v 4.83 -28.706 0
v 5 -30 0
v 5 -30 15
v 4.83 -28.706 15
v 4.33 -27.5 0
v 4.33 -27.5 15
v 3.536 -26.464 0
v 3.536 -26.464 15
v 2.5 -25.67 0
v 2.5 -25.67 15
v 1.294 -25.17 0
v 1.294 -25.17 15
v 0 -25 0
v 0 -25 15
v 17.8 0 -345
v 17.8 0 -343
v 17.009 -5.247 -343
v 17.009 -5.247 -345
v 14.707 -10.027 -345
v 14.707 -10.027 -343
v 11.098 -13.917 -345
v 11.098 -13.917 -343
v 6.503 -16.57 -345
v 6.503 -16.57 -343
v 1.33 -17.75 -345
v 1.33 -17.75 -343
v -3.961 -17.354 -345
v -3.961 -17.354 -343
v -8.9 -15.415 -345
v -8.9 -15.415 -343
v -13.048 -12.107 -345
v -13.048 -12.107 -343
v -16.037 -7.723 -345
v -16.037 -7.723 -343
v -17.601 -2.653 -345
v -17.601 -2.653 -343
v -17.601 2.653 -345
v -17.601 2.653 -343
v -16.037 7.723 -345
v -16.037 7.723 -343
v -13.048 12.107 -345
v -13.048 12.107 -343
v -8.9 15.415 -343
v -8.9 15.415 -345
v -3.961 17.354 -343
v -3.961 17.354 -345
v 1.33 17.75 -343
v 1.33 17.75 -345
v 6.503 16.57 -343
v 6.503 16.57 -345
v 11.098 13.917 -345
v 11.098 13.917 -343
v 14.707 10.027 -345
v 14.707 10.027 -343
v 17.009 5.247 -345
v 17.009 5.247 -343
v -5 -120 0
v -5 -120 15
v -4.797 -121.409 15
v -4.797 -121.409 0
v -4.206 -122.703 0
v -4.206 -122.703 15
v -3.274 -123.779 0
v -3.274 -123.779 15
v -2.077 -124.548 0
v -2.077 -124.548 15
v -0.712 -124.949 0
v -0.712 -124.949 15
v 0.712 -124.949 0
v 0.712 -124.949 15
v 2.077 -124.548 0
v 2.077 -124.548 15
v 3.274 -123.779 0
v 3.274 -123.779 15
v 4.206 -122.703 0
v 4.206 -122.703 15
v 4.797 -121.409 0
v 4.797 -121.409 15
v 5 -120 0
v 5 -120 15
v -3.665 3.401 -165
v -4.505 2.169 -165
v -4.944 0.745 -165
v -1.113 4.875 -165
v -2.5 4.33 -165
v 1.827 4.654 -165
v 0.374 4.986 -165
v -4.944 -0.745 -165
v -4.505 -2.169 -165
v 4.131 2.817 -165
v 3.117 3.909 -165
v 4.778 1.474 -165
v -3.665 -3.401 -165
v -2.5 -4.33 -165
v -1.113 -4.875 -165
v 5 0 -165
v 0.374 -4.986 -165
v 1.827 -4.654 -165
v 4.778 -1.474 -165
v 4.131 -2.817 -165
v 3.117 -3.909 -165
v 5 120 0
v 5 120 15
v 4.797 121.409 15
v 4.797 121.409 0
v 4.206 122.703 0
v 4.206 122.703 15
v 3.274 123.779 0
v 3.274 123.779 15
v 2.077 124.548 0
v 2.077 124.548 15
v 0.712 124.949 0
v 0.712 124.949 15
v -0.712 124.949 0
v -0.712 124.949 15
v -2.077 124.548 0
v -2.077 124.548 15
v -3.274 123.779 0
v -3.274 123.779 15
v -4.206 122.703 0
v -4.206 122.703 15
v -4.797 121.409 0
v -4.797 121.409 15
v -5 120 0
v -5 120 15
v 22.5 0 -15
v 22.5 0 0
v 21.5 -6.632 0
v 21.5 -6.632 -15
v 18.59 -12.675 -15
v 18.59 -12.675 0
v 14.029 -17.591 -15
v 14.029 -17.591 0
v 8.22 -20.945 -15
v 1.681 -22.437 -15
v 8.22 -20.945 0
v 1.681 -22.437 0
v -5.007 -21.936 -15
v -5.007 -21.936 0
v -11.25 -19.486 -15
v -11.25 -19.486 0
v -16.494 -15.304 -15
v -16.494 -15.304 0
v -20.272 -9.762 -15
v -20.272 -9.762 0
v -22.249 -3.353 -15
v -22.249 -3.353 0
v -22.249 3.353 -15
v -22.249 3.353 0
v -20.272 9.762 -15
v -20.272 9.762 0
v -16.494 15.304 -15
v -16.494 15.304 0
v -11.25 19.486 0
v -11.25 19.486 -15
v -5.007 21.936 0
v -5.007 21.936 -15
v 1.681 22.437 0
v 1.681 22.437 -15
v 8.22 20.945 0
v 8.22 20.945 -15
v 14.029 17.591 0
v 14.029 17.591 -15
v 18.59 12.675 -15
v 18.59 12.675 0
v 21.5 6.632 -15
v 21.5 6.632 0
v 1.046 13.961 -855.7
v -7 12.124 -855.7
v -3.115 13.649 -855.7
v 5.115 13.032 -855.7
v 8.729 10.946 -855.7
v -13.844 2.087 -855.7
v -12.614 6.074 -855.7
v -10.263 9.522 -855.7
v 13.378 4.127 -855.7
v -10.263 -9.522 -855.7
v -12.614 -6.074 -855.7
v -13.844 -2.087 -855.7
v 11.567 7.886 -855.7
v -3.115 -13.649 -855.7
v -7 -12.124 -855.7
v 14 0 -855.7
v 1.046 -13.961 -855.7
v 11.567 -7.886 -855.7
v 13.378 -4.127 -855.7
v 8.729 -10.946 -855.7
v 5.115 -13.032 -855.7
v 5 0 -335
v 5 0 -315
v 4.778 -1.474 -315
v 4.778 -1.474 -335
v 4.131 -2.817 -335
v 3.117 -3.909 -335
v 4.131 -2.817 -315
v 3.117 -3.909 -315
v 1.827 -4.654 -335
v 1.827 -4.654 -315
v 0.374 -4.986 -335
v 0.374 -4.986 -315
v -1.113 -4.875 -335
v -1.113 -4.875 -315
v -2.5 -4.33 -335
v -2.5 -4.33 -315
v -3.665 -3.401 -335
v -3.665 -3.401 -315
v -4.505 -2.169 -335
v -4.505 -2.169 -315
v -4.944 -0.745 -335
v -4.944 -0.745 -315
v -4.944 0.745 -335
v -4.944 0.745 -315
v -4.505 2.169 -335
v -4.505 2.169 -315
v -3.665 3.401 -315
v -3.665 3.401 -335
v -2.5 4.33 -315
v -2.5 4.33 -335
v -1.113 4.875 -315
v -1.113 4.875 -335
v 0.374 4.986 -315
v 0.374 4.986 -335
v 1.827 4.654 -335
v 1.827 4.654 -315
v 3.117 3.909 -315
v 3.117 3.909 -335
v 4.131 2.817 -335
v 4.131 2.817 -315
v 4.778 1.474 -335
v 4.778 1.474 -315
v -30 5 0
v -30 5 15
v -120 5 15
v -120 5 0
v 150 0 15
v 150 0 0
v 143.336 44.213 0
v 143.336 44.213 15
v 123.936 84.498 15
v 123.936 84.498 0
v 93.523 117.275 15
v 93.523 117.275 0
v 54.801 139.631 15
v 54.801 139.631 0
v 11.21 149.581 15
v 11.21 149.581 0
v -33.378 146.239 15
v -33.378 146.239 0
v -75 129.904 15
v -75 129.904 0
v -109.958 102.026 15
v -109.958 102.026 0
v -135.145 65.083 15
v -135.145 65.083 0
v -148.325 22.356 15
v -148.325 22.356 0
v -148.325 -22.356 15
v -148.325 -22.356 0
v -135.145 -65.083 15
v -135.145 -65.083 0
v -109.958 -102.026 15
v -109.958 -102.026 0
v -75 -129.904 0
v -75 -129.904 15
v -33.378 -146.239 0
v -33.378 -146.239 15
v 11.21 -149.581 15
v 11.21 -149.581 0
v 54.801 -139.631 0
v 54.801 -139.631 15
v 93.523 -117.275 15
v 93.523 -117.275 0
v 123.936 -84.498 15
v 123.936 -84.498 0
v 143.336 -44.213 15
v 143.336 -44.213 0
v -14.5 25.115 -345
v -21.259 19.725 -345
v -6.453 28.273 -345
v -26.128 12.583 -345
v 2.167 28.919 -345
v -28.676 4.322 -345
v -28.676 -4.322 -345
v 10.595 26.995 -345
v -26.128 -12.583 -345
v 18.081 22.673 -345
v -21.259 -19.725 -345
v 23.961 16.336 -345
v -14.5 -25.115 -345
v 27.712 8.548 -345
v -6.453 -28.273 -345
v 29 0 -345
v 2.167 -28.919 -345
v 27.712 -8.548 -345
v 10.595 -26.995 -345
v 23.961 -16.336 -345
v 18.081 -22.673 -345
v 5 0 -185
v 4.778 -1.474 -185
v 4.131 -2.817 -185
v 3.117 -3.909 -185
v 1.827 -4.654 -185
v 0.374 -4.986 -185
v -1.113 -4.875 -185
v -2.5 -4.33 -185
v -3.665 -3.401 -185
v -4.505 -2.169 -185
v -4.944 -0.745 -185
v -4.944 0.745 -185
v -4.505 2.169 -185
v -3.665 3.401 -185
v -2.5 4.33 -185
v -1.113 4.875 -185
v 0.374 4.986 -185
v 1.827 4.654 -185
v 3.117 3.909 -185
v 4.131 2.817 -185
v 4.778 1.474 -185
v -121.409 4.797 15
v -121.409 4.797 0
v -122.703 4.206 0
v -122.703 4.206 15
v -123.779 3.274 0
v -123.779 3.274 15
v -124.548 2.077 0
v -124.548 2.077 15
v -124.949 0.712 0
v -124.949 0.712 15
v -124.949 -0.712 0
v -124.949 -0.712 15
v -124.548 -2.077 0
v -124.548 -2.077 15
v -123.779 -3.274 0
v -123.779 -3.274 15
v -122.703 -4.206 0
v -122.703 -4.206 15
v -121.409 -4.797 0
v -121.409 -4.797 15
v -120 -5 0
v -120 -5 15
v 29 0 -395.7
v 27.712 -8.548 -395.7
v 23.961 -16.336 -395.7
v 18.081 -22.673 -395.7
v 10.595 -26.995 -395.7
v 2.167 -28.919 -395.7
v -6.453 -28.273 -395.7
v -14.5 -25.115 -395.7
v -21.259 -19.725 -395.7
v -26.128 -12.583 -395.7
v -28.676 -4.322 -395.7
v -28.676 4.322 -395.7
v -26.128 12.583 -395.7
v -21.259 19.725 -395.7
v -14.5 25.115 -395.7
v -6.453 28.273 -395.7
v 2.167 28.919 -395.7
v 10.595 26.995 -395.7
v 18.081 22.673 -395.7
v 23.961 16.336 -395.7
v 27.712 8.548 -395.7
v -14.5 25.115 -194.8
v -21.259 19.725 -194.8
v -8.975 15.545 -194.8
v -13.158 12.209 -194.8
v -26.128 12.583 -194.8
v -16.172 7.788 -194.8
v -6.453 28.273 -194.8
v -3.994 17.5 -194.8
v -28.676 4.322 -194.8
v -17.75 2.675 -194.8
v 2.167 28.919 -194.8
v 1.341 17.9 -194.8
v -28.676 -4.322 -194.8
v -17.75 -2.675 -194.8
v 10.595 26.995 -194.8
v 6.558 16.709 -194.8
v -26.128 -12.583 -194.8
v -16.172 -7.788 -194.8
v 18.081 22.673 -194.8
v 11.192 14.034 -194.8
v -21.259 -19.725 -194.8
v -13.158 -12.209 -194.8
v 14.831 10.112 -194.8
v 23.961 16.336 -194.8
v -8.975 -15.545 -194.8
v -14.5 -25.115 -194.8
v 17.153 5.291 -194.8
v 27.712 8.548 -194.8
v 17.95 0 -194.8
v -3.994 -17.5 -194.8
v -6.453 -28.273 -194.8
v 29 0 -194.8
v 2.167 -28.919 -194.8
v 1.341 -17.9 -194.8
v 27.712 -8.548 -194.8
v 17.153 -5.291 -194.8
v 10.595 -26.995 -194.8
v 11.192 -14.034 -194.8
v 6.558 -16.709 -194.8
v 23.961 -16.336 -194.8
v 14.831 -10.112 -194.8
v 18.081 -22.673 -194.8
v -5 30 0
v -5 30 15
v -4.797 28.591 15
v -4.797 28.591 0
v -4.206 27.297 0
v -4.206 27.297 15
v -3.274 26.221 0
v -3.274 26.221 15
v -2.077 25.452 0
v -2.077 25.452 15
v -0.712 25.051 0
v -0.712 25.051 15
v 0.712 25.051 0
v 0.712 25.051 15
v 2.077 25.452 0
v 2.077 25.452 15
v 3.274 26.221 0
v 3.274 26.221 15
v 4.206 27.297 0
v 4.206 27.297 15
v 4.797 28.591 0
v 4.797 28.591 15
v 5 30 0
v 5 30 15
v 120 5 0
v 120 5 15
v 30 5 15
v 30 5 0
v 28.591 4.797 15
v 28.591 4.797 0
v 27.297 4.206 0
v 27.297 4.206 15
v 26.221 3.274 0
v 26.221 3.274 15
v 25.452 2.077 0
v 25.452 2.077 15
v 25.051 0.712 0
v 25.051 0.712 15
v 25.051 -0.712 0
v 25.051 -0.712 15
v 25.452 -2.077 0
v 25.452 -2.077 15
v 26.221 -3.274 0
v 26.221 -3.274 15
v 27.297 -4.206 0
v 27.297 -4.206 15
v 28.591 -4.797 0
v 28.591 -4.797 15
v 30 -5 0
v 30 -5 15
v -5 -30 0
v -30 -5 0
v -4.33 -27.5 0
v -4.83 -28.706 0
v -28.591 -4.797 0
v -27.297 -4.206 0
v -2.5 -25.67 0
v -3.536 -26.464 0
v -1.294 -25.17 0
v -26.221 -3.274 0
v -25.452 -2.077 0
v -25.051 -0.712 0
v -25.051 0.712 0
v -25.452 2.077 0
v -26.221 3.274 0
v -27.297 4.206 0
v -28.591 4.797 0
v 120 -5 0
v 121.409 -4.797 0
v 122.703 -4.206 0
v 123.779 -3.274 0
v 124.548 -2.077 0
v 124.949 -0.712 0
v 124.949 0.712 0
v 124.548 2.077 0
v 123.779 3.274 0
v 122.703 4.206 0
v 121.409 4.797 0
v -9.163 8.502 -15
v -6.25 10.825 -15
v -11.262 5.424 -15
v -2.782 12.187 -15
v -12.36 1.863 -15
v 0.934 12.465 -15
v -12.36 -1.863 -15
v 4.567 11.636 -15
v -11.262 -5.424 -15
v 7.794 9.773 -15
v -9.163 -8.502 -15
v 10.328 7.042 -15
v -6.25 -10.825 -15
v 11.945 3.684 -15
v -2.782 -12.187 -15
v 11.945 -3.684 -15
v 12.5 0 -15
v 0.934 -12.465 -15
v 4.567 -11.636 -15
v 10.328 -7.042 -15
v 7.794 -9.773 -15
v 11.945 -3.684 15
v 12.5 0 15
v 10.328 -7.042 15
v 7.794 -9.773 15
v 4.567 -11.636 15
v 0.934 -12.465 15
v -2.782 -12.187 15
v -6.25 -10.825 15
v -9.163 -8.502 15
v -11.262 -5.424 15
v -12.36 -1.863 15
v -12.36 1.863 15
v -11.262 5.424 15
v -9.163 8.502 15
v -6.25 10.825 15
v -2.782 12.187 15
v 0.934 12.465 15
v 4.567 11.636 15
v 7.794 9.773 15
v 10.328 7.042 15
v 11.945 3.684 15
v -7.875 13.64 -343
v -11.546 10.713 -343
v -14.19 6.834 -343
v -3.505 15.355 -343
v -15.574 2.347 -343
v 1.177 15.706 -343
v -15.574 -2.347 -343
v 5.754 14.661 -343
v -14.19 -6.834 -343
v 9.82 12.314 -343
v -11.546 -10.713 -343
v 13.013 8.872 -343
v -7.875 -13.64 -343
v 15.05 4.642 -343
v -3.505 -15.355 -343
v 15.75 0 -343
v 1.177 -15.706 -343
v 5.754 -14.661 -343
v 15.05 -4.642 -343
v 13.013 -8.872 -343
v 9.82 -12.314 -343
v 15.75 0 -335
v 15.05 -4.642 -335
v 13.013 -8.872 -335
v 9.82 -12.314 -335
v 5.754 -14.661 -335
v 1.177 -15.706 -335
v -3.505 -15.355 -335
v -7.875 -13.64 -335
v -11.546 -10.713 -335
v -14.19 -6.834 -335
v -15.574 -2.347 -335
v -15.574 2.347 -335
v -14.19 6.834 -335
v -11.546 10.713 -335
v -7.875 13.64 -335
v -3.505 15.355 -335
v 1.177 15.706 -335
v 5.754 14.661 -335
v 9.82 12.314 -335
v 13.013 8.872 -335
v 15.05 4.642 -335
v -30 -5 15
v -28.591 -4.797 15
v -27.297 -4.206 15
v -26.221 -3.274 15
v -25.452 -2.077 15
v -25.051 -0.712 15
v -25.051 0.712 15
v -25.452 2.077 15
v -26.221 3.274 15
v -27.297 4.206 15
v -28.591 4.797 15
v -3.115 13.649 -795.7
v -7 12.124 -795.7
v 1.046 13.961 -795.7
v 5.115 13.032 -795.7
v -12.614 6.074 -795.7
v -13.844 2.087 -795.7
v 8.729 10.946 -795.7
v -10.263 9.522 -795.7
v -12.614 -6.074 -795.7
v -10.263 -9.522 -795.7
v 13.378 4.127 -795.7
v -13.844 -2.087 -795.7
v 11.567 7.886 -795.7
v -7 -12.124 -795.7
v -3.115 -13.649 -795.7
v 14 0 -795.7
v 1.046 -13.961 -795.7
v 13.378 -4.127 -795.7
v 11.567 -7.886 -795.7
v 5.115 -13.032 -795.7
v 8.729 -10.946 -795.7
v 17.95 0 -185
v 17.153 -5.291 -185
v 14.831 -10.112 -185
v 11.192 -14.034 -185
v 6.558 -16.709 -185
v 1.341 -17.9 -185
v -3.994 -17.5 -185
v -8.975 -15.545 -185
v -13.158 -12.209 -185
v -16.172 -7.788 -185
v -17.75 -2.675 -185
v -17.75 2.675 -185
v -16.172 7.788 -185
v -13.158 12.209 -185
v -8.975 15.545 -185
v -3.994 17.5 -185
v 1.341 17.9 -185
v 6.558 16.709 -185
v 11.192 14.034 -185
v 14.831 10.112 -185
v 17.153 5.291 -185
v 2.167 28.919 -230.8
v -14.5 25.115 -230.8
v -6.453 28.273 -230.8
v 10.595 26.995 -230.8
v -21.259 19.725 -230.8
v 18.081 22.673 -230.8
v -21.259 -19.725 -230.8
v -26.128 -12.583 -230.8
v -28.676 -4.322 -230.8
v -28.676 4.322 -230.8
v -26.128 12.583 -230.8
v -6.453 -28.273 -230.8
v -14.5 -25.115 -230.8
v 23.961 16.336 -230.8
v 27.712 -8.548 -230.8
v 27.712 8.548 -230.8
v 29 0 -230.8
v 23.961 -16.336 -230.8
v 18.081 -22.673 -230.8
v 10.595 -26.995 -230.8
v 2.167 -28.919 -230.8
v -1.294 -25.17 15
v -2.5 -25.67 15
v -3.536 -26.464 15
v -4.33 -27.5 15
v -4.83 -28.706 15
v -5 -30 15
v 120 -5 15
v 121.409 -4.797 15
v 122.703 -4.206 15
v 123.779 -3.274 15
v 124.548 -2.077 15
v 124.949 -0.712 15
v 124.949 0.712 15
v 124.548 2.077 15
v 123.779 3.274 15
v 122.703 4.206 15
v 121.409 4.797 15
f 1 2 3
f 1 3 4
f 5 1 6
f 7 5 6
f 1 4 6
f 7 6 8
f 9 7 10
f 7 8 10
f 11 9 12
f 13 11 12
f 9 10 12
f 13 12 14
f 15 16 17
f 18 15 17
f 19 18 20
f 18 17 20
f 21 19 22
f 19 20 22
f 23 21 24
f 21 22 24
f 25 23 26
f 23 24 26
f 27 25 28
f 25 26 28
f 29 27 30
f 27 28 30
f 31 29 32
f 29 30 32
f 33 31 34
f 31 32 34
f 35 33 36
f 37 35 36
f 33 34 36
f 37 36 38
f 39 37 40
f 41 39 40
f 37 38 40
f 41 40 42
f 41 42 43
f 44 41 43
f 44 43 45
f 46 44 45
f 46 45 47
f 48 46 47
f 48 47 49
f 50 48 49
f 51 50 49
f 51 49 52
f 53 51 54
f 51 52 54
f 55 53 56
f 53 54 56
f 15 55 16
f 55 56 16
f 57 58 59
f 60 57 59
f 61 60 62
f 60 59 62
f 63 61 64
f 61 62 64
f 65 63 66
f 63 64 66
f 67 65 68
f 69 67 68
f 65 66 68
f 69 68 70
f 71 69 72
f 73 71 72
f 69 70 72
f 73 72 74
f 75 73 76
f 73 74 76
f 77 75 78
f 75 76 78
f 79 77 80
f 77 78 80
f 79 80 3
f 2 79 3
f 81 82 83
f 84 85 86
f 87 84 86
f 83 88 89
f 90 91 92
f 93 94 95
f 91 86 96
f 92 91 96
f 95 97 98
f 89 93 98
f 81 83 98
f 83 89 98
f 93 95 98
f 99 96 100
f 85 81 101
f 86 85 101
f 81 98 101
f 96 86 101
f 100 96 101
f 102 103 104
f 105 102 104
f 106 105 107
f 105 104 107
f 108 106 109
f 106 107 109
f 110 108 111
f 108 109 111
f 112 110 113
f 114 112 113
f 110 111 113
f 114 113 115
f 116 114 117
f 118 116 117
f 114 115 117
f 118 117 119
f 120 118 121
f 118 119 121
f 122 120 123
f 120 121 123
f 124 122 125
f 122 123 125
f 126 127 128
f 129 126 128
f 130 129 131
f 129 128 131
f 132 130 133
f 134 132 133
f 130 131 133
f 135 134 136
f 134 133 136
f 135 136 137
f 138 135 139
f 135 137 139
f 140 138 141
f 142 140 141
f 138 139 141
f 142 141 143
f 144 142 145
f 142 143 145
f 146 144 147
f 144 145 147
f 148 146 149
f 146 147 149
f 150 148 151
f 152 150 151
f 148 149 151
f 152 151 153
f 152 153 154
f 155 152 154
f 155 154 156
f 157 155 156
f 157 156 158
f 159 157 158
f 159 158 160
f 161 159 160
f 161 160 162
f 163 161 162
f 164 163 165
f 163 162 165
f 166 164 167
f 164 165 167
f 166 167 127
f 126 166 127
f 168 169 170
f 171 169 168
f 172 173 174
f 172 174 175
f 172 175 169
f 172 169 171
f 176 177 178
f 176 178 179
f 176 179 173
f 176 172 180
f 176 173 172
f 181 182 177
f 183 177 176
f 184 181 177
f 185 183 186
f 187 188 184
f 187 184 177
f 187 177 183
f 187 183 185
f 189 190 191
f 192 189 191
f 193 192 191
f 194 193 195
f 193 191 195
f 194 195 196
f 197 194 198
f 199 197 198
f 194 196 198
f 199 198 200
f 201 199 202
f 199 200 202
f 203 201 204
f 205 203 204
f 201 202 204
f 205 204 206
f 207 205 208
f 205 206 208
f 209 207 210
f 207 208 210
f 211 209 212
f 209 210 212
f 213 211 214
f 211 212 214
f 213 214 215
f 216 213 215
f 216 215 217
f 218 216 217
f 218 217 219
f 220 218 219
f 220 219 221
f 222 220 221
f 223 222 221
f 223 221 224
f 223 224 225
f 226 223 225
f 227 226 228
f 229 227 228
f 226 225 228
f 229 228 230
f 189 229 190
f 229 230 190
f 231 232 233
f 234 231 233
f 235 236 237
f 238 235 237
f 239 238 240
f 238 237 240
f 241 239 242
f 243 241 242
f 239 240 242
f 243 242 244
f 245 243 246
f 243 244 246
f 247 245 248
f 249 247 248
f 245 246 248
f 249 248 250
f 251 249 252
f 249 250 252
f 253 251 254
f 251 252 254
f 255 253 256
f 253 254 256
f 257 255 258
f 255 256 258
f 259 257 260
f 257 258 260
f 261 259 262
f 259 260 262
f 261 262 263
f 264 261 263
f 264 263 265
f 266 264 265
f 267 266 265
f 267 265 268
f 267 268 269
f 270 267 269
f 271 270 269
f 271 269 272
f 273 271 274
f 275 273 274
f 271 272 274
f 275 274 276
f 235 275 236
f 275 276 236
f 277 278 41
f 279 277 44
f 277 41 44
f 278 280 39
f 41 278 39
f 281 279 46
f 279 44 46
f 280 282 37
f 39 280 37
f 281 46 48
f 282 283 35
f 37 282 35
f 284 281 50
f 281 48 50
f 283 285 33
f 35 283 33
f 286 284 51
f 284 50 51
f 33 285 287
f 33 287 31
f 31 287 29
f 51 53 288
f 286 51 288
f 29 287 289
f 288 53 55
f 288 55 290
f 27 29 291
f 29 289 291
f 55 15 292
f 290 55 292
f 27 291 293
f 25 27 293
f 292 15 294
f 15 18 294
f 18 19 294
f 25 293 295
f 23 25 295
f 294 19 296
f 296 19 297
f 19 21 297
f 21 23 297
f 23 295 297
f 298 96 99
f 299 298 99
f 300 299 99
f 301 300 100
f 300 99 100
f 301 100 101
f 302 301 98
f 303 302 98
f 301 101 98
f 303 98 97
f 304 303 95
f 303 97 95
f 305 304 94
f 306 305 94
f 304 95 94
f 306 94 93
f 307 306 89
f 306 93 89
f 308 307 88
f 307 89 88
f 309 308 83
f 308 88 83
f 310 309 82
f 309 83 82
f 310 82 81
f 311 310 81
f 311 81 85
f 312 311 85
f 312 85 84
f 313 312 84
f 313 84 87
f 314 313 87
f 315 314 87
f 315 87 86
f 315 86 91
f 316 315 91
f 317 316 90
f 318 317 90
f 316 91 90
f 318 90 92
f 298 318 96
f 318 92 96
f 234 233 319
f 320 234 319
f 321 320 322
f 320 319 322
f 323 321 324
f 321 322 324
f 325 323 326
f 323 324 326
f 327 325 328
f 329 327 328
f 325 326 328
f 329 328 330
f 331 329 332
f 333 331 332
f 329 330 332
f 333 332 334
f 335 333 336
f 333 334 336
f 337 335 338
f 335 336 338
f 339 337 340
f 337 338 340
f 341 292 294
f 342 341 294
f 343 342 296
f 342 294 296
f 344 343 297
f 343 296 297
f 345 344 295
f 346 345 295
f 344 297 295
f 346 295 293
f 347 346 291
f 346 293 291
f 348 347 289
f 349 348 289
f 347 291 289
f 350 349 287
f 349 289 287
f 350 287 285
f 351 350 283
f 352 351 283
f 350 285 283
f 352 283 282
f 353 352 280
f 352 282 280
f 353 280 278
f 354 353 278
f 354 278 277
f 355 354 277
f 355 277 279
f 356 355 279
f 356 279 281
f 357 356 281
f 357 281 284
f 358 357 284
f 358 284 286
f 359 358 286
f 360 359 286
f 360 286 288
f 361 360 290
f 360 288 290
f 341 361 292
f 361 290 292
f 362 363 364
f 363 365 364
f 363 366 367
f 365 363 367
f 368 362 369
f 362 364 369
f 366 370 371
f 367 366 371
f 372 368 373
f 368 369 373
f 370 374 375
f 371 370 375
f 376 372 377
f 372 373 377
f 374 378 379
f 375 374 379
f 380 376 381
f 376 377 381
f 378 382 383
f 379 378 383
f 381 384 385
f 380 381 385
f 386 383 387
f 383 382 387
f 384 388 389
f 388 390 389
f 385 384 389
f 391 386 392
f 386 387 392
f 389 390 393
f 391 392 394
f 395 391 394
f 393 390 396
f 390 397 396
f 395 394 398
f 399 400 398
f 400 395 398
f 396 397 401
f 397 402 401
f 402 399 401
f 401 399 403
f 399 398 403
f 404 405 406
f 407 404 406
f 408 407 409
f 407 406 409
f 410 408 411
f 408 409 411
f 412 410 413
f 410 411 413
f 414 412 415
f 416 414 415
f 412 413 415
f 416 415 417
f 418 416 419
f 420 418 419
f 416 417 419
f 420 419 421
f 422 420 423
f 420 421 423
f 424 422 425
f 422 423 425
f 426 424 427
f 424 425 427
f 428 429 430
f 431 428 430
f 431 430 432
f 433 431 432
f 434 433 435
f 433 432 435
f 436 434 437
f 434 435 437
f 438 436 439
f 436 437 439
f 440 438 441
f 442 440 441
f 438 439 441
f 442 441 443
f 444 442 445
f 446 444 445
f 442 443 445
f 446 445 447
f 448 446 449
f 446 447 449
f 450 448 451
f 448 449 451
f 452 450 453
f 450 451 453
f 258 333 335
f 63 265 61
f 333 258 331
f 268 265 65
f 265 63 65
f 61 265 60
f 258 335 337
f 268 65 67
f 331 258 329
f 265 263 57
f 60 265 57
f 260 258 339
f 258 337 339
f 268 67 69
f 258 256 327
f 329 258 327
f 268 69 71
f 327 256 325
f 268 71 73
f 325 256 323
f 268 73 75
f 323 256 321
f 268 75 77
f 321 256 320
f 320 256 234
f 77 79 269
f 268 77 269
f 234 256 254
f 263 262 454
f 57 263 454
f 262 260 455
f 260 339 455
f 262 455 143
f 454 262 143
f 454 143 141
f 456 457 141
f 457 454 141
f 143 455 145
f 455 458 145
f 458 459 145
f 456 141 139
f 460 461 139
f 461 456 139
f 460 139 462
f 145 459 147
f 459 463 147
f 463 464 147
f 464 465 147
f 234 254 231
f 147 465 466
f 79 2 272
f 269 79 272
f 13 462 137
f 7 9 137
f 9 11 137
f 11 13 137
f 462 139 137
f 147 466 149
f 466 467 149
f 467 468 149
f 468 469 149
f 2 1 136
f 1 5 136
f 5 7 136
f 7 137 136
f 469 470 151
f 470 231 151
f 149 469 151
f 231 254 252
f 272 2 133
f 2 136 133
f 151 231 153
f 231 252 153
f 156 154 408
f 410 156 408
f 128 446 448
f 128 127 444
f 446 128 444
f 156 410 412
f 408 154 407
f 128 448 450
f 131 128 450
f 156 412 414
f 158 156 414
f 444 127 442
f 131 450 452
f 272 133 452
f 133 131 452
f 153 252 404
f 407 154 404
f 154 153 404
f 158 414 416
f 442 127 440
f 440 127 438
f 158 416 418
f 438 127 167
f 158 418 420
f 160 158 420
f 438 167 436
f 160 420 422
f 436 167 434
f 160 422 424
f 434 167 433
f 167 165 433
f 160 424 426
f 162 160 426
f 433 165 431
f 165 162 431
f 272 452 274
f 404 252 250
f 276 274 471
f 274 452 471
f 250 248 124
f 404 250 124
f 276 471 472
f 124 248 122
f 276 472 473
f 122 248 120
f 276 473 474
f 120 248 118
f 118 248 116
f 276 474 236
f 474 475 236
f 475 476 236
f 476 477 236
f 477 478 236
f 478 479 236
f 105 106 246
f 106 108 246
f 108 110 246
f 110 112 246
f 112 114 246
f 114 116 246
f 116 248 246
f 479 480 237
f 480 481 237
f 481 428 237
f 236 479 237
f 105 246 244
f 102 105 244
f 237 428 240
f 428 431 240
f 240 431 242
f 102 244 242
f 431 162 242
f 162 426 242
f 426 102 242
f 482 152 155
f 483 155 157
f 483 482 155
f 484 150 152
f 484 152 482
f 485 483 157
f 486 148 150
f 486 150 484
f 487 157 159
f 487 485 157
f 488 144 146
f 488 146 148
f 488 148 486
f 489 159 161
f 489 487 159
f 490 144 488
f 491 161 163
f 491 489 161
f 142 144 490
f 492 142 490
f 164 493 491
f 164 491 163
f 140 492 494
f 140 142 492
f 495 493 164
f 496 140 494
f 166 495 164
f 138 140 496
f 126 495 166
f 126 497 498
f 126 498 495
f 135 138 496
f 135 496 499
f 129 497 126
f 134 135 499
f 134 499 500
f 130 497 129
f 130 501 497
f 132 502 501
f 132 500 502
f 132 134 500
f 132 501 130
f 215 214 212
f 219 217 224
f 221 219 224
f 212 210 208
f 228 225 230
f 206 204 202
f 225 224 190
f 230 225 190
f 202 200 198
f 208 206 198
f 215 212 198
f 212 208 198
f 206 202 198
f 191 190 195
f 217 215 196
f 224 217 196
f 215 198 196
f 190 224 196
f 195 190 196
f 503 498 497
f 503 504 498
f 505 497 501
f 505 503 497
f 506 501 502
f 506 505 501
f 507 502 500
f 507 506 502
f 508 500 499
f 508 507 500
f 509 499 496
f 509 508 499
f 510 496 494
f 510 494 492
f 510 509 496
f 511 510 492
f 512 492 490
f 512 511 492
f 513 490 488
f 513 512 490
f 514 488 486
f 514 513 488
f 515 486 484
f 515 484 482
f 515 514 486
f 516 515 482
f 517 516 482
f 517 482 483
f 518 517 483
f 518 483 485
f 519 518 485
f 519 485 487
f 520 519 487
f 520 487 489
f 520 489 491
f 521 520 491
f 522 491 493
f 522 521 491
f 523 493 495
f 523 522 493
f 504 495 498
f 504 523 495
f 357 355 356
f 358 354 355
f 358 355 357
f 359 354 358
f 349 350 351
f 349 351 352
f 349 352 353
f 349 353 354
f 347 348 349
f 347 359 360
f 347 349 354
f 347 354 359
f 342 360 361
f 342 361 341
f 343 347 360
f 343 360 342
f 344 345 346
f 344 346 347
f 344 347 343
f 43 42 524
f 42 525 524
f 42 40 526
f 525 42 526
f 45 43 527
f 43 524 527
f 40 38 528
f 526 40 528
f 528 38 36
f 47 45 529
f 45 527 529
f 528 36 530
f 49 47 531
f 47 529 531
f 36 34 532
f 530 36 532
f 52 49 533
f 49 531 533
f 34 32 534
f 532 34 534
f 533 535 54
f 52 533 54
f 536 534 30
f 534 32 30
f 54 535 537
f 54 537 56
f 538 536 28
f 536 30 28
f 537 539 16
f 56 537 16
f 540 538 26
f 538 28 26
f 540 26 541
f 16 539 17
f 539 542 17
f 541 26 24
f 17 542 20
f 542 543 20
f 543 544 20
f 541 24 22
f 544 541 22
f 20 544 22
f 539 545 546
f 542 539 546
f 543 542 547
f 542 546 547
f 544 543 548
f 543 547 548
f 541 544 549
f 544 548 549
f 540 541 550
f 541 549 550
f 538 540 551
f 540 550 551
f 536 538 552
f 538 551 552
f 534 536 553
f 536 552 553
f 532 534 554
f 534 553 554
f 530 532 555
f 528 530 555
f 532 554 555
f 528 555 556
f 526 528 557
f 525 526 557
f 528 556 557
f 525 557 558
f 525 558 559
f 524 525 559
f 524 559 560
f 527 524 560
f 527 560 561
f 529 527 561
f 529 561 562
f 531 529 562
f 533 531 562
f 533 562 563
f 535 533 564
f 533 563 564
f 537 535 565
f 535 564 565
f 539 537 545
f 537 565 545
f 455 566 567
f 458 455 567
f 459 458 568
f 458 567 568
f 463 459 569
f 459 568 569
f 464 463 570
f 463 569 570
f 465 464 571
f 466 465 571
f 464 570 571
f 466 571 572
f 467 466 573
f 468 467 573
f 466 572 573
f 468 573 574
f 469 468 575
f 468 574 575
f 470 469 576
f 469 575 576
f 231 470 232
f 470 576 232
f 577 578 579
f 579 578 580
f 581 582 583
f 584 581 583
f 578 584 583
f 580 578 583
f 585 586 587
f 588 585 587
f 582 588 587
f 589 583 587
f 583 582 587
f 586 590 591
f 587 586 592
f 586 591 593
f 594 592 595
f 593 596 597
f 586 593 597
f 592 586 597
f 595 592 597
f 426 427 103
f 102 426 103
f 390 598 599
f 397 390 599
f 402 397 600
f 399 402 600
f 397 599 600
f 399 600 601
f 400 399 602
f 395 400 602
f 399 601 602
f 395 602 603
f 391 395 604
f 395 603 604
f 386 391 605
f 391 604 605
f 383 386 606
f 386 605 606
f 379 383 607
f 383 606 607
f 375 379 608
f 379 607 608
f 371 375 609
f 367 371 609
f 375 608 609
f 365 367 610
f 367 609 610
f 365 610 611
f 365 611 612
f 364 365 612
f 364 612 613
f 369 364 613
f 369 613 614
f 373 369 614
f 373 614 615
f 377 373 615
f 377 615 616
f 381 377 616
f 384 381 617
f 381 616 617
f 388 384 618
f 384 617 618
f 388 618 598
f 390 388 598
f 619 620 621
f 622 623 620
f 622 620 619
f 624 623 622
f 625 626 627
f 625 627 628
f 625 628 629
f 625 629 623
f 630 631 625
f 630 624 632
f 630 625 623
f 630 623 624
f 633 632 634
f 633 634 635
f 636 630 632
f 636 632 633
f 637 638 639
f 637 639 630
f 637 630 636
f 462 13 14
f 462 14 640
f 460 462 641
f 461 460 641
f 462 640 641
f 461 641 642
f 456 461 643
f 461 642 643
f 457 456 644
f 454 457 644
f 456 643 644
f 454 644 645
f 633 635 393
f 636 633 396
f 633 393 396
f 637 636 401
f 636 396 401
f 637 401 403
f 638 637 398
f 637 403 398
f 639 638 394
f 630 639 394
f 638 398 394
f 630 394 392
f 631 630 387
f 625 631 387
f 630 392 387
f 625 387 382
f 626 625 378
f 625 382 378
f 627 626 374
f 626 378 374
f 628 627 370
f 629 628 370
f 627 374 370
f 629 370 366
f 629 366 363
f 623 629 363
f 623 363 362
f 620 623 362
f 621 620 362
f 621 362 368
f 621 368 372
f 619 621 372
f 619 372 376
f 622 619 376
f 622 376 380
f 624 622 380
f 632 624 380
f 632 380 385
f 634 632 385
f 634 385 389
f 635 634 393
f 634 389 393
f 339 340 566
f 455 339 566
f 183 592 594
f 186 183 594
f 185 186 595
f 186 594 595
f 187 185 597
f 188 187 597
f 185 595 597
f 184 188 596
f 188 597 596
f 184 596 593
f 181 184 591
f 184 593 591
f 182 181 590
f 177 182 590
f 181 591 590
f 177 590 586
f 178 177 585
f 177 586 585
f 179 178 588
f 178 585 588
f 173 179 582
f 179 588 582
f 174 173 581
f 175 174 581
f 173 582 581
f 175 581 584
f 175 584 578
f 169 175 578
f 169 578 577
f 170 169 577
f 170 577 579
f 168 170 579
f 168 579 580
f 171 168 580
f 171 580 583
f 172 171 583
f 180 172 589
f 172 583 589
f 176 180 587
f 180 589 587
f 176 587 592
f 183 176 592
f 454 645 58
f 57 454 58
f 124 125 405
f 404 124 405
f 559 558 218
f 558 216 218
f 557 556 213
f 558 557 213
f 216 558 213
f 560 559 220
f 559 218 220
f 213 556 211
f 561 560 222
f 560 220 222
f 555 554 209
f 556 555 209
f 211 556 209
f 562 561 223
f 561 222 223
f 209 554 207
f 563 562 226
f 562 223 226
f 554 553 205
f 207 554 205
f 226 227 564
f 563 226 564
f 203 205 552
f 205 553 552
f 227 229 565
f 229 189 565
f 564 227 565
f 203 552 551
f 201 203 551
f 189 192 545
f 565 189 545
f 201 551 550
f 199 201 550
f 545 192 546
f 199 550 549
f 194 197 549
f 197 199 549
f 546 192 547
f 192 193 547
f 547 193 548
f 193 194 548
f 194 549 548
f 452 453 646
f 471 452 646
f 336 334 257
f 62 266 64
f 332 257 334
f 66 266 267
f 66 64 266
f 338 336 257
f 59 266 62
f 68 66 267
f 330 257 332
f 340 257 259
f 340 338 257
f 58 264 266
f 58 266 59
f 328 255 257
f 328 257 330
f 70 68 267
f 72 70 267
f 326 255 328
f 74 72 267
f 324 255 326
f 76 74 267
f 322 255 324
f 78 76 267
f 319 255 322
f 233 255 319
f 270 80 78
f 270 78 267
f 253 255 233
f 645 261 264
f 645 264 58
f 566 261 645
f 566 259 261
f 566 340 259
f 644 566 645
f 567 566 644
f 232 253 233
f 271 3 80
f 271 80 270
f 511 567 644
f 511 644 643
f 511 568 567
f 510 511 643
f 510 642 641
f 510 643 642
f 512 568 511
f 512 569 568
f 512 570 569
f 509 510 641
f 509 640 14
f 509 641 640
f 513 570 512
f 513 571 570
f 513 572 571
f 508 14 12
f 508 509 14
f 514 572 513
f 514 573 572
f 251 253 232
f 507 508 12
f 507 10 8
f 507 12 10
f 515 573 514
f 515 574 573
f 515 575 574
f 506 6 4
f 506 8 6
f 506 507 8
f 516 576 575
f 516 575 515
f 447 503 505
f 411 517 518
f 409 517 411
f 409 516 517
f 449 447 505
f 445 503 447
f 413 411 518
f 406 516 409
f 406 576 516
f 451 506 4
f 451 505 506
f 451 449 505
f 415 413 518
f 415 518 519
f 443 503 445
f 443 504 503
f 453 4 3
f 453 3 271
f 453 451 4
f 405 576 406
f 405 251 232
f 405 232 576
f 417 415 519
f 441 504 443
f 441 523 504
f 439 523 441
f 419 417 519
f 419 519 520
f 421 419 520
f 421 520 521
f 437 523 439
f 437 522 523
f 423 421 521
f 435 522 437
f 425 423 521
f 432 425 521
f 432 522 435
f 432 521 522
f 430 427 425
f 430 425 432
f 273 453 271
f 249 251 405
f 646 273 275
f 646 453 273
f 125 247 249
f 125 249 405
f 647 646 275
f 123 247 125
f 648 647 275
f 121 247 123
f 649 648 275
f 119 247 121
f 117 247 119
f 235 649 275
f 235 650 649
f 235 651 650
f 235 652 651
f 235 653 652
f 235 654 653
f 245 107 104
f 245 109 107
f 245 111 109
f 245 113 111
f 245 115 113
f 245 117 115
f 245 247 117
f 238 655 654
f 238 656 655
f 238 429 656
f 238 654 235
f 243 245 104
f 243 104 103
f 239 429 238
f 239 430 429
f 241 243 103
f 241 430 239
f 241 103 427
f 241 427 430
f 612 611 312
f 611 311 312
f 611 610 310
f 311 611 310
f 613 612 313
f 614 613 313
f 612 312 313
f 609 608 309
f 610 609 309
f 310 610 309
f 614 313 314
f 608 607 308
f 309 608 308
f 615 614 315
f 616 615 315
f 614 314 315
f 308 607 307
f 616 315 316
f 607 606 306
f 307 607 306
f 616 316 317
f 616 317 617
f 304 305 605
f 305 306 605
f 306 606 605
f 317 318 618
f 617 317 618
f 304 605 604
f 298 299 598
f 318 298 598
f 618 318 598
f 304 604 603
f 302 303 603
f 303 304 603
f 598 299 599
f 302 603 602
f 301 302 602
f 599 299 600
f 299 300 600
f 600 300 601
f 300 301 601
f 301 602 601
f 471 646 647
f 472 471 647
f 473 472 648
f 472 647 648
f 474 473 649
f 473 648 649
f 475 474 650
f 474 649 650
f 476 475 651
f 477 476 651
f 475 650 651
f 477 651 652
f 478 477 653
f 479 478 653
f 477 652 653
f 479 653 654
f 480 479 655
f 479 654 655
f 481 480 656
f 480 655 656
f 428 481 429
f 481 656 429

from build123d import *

# Parameters (mm, degrees)
F0_R      = 150
F0_R_2    = 12.5
F1_DEPTH  = 15
F2_R      = 22.5
F2_R_2    = 12.5
F3_DEPTH  = 15
F5_DEPTH  = 25
F7_R      = 5
F8_DEPTH  = 20
F9_R      = 17.95
F10_DEPTH = 9.8
F11_R     = 29
F12_DEPTH = 36
F14_R     = 5
F15_DEPTH = 20
F16_R     = 15.75
F17_DEPTH = 8
F18_R     = 17.8
F19_DEPTH = 2
F20_R     = 29
F21_DEPTH = 50.7
F23_R     = 14
F24_DEPTH = 60


with BuildPart() as f1:
    # F0 (on Top) → F1 (new body)
    with BuildSketch(Plane.XY):
        Circle(F0_R)
        Circle(F0_R_2, mode=Mode.SUBTRACT)
    extrude(amount=F1_DEPTH)

    # F2 (on face) → F3 (join)
    with BuildSketch(Plane(origin=(0, 0, 0), x_dir=(1, 0, 0), z_dir=(0, 0, -1))):
        Circle(F2_R)
        Circle(F2_R_2, mode=Mode.SUBTRACT)
    extrude(amount=F3_DEPTH)

    # F4 (on face) → F5 (cut)
    with BuildSketch(Plane.XY.offset(15)):
        with BuildLine():
            ThreePointArc((0, -25), (-3.5355339059, -26.4644660941), (-5, -30))
            Line((-5, -30), (-5, -120))
            ThreePointArc((-5, -120), (0, -125), (5, -120))
            Line((5, -120), (5, -30))
            ThreePointArc((5, -30), (3.5355339059, -26.4644660941), (0, -25))
        make_face()
        with BuildLine():
            Line((120, 5), (30, 5))
            ThreePointArc((30, 5), (25, 0), (30, -5))
            Line((30, -5), (120, -5))
            ThreePointArc((120, -5), (125, 0), (120, 5))
        make_face()
        with BuildLine():
            Line((-5, 120), (-5, 30))
            ThreePointArc((-5, 30), (0, 25), (5, 30))
            Line((5, 30), (5, 120))
            ThreePointArc((5, 120), (0, 125), (-5, 120))
        make_face()
        with BuildLine():
            Line((-120, -5), (-30, -5))
            ThreePointArc((-30, -5), (-25, 0), (-30, 5))
            Line((-30, 5), (-120, 5))
            ThreePointArc((-120, 5), (-125, 0), (-120, -5))
        make_face()
    extrude(amount=-F5_DEPTH, mode=Mode.SUBTRACT)


with BuildPart() as f8:
    # F7 (on offset) → F8 (new body)
    with BuildSketch(Plane(origin=(0, 0, -165), x_dir=(1, 0, 0), z_dir=(0, 0, -1))):
        Circle(F7_R)
    extrude(amount=F8_DEPTH)

    # F9 (on face) → F10 (join)
    with BuildSketch(Plane(origin=(0, 0, -185), x_dir=(1, 0, 0), z_dir=(0, 0, -1))):
        Circle(F9_R)
    extrude(amount=F10_DEPTH)

    # F11 (on face) → F12 (join)
    with BuildSketch(Plane(origin=(0, 0, -194.8), x_dir=(1, 0, 0), z_dir=(0, 0, -1))):
        Circle(F11_R)
    extrude(amount=F12_DEPTH)


with BuildPart() as f15:
    # F14 (on offset) → F15 (new body)
    with BuildSketch(Plane(origin=(0, 0, -315), x_dir=(1, 0, 0), z_dir=(0, 0, -1))):
        Circle(F14_R)
    extrude(amount=F15_DEPTH)

    # F16 (on face) → F17 (join)
    with BuildSketch(Plane(origin=(0, 0, -335), x_dir=(1, 0, 0), z_dir=(0, 0, -1))):
        Circle(F16_R)
    extrude(amount=F17_DEPTH)

    # F18 (on face) → F19 (join)
    with BuildSketch(Plane(origin=(0, 0, -343), x_dir=(1, 0, 0), z_dir=(0, 0, -1))):
        Circle(F18_R)
    extrude(amount=F19_DEPTH)

    # F20 (on face) → F21 (join)
    with BuildSketch(Plane(origin=(0, 0, -345), x_dir=(1, 0, 0), z_dir=(0, 0, -1))):
        Circle(F20_R)
    extrude(amount=F21_DEPTH)


with BuildPart() as f24:
    # F23 (on offset) → F24 (new body)
    with BuildSketch(Plane(origin=(0, 0, -795.7), x_dir=(1, 0, 0), z_dir=(0, 0, -1))):
        Circle(F23_R)
    extrude(amount=F24_DEPTH)


solid = Compound([f1.part, f8.part, f15.part, f24.part])
